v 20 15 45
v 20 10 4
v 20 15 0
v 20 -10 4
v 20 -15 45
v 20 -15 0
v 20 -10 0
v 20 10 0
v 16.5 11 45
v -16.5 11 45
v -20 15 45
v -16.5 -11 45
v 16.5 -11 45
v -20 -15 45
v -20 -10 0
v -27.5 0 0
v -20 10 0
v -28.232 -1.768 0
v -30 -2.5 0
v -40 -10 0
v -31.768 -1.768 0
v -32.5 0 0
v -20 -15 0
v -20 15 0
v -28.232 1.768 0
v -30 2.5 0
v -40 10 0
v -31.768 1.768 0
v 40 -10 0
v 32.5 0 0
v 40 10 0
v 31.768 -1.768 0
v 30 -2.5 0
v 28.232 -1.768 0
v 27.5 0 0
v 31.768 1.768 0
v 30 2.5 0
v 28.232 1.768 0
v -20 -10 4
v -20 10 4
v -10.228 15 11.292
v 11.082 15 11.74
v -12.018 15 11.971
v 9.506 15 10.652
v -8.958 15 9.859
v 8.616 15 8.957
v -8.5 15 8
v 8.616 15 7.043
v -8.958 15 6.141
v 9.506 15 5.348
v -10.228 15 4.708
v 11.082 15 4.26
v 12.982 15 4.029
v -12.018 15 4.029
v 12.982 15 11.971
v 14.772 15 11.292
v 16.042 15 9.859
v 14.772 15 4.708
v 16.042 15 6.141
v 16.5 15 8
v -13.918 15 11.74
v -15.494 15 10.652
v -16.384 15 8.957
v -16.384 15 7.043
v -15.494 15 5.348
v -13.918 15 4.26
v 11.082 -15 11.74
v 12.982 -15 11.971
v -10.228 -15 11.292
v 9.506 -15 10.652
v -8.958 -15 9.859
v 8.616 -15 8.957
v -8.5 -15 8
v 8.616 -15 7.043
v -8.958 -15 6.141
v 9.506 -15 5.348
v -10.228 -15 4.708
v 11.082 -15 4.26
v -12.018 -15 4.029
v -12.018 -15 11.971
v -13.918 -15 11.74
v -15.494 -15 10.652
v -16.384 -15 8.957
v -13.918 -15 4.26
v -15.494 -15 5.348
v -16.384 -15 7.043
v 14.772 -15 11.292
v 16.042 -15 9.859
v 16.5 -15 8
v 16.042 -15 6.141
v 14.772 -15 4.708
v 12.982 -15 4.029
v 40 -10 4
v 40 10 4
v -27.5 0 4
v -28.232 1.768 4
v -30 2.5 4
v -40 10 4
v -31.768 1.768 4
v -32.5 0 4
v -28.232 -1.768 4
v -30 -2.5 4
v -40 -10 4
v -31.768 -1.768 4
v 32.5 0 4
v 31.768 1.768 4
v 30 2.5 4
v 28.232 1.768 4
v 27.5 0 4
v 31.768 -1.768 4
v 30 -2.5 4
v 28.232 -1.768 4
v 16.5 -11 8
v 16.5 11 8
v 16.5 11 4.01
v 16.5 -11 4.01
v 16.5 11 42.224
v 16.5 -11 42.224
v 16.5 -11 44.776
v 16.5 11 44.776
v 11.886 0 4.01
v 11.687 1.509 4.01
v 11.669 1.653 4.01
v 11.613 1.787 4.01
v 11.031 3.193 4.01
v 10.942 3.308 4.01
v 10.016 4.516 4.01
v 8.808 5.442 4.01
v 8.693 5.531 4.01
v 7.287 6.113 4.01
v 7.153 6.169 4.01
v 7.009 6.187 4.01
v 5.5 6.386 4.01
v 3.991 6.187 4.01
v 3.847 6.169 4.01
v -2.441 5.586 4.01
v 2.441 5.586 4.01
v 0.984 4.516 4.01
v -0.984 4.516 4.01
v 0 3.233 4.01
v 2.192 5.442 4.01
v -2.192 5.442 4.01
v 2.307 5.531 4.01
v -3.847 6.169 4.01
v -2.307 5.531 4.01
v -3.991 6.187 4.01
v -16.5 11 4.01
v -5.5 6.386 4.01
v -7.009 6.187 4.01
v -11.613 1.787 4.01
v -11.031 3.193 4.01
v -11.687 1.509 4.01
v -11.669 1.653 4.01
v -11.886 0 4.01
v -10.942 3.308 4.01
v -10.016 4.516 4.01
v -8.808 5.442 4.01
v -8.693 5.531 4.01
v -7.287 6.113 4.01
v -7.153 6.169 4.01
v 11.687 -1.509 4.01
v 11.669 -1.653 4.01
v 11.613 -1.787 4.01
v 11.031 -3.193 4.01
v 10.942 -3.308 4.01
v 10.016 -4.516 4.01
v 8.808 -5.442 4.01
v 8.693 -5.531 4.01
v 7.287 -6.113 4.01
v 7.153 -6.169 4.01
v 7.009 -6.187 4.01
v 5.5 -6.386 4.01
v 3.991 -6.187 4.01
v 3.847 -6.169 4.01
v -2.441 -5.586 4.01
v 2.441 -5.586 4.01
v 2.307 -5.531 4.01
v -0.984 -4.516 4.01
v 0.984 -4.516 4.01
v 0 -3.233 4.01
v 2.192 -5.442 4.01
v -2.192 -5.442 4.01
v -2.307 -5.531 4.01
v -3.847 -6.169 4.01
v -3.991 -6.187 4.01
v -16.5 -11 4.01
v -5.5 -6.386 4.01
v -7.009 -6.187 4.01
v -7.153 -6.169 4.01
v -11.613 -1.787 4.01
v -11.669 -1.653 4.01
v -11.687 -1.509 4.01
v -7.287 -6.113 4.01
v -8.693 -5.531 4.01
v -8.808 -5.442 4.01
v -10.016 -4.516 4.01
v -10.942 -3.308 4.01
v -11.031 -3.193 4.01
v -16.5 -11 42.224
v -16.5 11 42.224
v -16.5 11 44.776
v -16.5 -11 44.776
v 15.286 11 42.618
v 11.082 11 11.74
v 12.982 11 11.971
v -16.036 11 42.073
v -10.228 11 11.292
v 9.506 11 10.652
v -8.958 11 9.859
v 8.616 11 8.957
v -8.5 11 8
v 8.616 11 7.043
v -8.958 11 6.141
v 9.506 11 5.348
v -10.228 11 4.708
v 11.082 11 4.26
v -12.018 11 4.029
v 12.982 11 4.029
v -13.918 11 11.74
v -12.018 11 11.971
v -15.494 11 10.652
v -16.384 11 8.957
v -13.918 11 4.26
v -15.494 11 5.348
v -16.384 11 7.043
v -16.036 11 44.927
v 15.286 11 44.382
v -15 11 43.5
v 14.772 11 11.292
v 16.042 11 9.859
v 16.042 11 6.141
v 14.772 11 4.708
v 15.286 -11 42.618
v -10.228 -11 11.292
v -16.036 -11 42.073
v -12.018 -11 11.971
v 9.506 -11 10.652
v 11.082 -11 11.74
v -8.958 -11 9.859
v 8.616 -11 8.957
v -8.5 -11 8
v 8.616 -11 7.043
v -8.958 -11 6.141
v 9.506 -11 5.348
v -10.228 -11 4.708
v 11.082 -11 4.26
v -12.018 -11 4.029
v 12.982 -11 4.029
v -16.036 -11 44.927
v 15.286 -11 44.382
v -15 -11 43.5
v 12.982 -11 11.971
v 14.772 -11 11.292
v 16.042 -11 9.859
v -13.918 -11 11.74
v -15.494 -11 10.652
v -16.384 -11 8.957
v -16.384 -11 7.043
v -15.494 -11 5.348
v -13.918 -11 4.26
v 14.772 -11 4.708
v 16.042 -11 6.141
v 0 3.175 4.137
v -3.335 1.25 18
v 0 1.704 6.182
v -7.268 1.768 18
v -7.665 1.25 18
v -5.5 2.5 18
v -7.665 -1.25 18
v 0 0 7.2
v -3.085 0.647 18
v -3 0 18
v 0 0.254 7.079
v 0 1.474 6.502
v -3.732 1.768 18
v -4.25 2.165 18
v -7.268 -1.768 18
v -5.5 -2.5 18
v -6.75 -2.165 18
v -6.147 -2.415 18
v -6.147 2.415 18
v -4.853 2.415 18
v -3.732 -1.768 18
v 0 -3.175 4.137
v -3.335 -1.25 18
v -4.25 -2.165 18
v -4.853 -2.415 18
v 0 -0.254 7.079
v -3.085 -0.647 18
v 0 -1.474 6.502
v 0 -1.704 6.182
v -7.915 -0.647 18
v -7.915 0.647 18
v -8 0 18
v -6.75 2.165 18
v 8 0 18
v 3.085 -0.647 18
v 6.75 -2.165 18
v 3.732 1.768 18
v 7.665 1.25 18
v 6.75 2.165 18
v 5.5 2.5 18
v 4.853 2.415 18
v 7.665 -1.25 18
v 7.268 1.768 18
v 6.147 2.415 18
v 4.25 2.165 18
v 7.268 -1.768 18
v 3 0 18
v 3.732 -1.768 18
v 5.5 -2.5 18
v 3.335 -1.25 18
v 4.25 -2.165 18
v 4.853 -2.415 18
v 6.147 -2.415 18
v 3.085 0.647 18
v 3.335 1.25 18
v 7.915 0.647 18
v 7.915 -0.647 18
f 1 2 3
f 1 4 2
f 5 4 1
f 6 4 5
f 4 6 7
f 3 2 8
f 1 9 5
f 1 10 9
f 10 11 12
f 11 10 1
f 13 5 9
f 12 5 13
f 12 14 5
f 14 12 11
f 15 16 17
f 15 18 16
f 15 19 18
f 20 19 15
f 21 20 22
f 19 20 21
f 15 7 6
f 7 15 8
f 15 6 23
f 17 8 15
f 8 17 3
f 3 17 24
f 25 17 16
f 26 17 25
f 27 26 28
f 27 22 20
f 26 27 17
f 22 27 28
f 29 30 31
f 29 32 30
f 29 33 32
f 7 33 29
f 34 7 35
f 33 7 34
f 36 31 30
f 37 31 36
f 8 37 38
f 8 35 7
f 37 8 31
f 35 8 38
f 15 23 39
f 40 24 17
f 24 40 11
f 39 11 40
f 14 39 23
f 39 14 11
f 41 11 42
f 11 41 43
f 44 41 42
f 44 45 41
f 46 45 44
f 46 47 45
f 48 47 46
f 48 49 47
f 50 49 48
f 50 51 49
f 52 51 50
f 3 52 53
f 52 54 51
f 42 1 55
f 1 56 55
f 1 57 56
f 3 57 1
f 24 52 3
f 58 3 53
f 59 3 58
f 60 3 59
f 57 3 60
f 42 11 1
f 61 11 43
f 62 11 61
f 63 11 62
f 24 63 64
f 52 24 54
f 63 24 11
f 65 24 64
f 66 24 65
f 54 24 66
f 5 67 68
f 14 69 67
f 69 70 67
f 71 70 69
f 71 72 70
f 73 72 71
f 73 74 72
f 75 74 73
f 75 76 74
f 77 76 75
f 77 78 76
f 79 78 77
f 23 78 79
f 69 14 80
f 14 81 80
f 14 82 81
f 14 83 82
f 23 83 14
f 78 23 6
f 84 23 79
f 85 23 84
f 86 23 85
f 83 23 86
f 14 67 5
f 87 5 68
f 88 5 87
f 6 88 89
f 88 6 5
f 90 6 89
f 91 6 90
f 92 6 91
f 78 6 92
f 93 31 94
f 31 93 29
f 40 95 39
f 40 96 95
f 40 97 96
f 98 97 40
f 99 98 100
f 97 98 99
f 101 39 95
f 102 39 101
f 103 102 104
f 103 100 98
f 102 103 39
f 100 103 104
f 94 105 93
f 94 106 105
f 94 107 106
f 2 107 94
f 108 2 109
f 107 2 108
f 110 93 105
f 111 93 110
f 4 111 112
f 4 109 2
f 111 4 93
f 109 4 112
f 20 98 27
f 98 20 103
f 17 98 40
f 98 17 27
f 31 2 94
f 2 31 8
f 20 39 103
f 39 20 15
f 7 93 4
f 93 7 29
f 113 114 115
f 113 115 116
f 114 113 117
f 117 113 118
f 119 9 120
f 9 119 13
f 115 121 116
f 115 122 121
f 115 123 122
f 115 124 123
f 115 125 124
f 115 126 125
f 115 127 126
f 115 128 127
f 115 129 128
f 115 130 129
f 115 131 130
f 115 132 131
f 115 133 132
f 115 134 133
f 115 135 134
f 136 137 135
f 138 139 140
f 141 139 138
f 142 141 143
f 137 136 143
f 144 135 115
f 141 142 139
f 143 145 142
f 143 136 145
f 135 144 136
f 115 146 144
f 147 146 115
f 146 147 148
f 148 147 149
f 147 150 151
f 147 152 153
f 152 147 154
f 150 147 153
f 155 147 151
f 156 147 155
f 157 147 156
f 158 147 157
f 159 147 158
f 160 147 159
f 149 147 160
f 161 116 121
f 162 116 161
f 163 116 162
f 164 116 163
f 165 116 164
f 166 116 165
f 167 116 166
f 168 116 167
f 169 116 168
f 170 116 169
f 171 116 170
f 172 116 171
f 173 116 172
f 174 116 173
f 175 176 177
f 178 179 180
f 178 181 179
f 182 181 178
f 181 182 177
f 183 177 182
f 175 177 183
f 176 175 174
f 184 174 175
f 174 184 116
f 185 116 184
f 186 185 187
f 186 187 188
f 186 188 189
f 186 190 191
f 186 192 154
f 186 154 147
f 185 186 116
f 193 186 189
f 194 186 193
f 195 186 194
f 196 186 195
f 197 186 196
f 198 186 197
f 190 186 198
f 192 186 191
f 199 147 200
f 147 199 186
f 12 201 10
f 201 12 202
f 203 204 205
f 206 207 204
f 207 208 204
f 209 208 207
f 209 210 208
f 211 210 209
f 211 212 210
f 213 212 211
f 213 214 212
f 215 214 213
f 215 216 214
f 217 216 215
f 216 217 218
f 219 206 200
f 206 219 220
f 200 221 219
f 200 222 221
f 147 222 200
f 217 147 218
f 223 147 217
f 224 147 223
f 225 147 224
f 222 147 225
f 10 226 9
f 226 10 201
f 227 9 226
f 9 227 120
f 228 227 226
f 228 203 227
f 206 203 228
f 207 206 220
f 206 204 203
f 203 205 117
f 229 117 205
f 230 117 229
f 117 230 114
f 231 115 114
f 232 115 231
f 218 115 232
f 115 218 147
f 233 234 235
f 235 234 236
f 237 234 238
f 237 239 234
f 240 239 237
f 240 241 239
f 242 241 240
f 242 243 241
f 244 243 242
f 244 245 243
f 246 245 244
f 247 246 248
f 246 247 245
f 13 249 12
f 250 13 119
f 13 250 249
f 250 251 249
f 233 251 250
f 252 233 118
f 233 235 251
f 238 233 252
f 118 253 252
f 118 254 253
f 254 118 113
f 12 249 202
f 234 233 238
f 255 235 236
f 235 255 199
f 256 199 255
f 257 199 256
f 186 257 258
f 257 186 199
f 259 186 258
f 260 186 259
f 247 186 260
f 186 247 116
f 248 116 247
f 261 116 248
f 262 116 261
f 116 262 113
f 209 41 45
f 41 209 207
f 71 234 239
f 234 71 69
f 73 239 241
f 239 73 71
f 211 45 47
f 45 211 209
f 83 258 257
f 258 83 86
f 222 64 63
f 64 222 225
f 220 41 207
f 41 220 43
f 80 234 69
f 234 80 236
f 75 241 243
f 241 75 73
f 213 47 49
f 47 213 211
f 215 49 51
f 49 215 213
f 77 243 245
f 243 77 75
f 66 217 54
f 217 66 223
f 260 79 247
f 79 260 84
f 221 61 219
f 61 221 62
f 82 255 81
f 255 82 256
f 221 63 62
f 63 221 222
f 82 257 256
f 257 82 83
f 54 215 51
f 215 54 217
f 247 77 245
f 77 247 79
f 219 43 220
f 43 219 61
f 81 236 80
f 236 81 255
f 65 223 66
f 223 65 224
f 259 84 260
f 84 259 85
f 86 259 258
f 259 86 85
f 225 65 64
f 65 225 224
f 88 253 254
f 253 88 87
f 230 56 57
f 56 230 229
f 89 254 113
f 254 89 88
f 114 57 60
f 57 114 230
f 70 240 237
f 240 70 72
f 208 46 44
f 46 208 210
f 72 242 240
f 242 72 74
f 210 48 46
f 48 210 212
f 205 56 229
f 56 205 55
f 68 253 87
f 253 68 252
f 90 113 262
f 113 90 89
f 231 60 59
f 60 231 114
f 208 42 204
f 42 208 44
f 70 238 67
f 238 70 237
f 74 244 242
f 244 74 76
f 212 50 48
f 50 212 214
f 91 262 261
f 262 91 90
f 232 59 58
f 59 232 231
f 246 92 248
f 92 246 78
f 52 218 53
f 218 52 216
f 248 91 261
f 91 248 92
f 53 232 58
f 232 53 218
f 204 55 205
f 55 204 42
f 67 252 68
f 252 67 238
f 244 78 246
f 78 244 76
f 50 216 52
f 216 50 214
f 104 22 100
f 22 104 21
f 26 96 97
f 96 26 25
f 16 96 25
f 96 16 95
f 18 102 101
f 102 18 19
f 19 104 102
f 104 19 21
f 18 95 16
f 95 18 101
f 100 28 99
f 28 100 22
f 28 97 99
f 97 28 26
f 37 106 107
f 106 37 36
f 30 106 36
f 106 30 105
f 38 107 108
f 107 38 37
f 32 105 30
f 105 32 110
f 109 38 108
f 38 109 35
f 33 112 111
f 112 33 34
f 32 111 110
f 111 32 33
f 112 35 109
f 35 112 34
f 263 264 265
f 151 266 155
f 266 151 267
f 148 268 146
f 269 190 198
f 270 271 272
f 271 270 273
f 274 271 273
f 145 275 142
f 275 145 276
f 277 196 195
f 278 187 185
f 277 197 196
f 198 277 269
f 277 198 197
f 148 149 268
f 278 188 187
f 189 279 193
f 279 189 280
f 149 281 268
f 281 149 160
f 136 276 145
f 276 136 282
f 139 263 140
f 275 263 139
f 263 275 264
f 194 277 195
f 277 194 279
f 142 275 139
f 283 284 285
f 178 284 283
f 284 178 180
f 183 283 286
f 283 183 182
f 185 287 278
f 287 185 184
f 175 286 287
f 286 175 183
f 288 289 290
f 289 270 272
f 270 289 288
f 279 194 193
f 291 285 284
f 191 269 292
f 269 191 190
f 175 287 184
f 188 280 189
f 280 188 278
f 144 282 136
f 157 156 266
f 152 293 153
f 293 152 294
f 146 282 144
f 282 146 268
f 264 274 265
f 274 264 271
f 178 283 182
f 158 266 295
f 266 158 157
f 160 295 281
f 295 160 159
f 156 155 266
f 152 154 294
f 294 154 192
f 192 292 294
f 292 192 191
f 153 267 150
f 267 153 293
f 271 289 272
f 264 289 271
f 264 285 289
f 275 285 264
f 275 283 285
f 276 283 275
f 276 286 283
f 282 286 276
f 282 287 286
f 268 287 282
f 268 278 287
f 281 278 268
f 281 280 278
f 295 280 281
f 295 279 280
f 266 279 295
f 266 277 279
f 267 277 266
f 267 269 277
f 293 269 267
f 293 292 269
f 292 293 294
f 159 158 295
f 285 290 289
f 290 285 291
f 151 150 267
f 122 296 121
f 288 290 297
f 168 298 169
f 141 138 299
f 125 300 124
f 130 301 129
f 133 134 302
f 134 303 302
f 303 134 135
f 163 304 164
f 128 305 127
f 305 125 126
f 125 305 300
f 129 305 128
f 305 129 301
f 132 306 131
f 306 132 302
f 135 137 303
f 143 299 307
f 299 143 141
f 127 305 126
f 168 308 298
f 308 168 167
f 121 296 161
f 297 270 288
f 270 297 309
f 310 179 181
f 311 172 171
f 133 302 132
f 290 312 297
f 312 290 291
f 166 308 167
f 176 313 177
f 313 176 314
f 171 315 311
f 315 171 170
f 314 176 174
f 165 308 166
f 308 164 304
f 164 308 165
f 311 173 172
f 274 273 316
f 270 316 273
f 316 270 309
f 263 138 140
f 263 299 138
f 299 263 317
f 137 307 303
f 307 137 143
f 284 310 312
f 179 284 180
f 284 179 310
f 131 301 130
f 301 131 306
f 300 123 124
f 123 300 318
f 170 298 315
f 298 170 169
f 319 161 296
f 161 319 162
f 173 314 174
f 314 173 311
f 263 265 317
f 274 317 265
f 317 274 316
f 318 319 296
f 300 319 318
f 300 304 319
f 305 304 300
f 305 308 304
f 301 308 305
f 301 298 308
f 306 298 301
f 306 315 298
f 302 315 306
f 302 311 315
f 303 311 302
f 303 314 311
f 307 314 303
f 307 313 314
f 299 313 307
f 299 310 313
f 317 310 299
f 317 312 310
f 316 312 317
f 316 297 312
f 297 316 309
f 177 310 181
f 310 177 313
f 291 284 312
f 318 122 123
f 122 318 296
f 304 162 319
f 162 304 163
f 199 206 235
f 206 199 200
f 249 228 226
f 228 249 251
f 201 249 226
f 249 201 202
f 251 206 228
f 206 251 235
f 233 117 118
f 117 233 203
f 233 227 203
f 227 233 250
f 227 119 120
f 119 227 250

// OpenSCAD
//PowerSwitchBox OpenSCAD Version 1.1
//Started on 2019.03.13.
//Updated on 2019.03.24.
//by MicroWizard

box_width		= 40;
box_depth		= 30;
box_height		= 45;
switch_width	= 33;	//full
switch_depth	= 22;
switch_height	= 27;
stand_top_dia	= 5;
stand_bot_dia	= 15;
stand_dist		= 11;
//extrusion 20x20
holder_depth	= 20;
holder_width	= box_width+2*(holder_depth);
holder_height	= 4;

wire_dia		= 8;
hole_dia		= 5;
fastener_dia	= 3;
x_wall			= (box_width-switch_width)/2;

adjust			= 0.01;
stand_height	= box_height - switch_height;
switch_off_x	= (box_width - switch_width)/2;
switch_off_y	= (box_depth - switch_depth)/2;
switch_off_z	= box_height - switch_height+adjust;

module SwitchBox(){
	union(){
		difference(){
			union(){
				//box
				translate([	-box_width/2,
							-box_depth/2,
							0]){
					cube(	size=[	box_width,
									box_depth,
									box_height],
							center=false);
				}
				//holder
				translate([	-holder_width/2,
							-holder_depth/2,
							0]){
					cube(	size=[	holder_width,
									holder_depth,
									holder_height],
							center=false);
				}
			}
			//--
			union(){
				//switch
				translate([	-switch_width/2,
							-switch_depth/2,
							holder_height+adjust]){
					cube(	size=[	switch_width,
									switch_depth,
									box_height-holder_height],
							center=false);
				}
				//wire holes
				translate([	-box_width/2+wire_dia/2+x_wall,
							0,
							holder_height+wire_dia/2]){
					rotate([90,0,0]){
						cylinder(	d=wire_dia,
									h=100,
									center=true
						);
					}
				}
				translate([	box_width/2-wire_dia/2-x_wall,
							0,
							holder_height+wire_dia/2]){
					rotate([90,0,0]){
						cylinder(	d=wire_dia,
									h=100,
									center=true
						);
					}
				}
				//holder holes
				translate([	-(holder_width-holder_depth)/2,
							0,
							-adjust]){
					cylinder(	d=hole_dia,
								h=holder_depth+2*adjust
							);
				}
				translate([	(holder_width-holder_depth)/2,
							0,
							-adjust]){
					cylinder(	d=hole_dia,
								h=holder_depth+2*adjust
							);
				}
			}
		}
		union(){
			//stands
			translate([	-stand_dist/2,0,0])
			cylinder(	d1=stand_bot_dia,
						d2=stand_top_dia,
						h=stand_height
					);
			translate([	stand_dist/2,0,0])
			cylinder(	d1=stand_bot_dia,
						d2=stand_top_dia,
						h=stand_height
					);
			//fasteners
			translate([	-switch_width/2,
							0,
							box_height-(fastener_dia/2)]){
				rotate([	90,0,0]){
					cylinder(	d=fastener_dia,
								h=box_depth,
							center=true
						);
				}
			}
			translate([	switch_width/2,
							0,
							box_height-(fastener_dia/2)]){
				rotate([	90,0,0]){
					cylinder(	d=fastener_dia,
								h=box_depth,
							center=true
						);
				}
			}
		}
	}
}

SwitchBox();
